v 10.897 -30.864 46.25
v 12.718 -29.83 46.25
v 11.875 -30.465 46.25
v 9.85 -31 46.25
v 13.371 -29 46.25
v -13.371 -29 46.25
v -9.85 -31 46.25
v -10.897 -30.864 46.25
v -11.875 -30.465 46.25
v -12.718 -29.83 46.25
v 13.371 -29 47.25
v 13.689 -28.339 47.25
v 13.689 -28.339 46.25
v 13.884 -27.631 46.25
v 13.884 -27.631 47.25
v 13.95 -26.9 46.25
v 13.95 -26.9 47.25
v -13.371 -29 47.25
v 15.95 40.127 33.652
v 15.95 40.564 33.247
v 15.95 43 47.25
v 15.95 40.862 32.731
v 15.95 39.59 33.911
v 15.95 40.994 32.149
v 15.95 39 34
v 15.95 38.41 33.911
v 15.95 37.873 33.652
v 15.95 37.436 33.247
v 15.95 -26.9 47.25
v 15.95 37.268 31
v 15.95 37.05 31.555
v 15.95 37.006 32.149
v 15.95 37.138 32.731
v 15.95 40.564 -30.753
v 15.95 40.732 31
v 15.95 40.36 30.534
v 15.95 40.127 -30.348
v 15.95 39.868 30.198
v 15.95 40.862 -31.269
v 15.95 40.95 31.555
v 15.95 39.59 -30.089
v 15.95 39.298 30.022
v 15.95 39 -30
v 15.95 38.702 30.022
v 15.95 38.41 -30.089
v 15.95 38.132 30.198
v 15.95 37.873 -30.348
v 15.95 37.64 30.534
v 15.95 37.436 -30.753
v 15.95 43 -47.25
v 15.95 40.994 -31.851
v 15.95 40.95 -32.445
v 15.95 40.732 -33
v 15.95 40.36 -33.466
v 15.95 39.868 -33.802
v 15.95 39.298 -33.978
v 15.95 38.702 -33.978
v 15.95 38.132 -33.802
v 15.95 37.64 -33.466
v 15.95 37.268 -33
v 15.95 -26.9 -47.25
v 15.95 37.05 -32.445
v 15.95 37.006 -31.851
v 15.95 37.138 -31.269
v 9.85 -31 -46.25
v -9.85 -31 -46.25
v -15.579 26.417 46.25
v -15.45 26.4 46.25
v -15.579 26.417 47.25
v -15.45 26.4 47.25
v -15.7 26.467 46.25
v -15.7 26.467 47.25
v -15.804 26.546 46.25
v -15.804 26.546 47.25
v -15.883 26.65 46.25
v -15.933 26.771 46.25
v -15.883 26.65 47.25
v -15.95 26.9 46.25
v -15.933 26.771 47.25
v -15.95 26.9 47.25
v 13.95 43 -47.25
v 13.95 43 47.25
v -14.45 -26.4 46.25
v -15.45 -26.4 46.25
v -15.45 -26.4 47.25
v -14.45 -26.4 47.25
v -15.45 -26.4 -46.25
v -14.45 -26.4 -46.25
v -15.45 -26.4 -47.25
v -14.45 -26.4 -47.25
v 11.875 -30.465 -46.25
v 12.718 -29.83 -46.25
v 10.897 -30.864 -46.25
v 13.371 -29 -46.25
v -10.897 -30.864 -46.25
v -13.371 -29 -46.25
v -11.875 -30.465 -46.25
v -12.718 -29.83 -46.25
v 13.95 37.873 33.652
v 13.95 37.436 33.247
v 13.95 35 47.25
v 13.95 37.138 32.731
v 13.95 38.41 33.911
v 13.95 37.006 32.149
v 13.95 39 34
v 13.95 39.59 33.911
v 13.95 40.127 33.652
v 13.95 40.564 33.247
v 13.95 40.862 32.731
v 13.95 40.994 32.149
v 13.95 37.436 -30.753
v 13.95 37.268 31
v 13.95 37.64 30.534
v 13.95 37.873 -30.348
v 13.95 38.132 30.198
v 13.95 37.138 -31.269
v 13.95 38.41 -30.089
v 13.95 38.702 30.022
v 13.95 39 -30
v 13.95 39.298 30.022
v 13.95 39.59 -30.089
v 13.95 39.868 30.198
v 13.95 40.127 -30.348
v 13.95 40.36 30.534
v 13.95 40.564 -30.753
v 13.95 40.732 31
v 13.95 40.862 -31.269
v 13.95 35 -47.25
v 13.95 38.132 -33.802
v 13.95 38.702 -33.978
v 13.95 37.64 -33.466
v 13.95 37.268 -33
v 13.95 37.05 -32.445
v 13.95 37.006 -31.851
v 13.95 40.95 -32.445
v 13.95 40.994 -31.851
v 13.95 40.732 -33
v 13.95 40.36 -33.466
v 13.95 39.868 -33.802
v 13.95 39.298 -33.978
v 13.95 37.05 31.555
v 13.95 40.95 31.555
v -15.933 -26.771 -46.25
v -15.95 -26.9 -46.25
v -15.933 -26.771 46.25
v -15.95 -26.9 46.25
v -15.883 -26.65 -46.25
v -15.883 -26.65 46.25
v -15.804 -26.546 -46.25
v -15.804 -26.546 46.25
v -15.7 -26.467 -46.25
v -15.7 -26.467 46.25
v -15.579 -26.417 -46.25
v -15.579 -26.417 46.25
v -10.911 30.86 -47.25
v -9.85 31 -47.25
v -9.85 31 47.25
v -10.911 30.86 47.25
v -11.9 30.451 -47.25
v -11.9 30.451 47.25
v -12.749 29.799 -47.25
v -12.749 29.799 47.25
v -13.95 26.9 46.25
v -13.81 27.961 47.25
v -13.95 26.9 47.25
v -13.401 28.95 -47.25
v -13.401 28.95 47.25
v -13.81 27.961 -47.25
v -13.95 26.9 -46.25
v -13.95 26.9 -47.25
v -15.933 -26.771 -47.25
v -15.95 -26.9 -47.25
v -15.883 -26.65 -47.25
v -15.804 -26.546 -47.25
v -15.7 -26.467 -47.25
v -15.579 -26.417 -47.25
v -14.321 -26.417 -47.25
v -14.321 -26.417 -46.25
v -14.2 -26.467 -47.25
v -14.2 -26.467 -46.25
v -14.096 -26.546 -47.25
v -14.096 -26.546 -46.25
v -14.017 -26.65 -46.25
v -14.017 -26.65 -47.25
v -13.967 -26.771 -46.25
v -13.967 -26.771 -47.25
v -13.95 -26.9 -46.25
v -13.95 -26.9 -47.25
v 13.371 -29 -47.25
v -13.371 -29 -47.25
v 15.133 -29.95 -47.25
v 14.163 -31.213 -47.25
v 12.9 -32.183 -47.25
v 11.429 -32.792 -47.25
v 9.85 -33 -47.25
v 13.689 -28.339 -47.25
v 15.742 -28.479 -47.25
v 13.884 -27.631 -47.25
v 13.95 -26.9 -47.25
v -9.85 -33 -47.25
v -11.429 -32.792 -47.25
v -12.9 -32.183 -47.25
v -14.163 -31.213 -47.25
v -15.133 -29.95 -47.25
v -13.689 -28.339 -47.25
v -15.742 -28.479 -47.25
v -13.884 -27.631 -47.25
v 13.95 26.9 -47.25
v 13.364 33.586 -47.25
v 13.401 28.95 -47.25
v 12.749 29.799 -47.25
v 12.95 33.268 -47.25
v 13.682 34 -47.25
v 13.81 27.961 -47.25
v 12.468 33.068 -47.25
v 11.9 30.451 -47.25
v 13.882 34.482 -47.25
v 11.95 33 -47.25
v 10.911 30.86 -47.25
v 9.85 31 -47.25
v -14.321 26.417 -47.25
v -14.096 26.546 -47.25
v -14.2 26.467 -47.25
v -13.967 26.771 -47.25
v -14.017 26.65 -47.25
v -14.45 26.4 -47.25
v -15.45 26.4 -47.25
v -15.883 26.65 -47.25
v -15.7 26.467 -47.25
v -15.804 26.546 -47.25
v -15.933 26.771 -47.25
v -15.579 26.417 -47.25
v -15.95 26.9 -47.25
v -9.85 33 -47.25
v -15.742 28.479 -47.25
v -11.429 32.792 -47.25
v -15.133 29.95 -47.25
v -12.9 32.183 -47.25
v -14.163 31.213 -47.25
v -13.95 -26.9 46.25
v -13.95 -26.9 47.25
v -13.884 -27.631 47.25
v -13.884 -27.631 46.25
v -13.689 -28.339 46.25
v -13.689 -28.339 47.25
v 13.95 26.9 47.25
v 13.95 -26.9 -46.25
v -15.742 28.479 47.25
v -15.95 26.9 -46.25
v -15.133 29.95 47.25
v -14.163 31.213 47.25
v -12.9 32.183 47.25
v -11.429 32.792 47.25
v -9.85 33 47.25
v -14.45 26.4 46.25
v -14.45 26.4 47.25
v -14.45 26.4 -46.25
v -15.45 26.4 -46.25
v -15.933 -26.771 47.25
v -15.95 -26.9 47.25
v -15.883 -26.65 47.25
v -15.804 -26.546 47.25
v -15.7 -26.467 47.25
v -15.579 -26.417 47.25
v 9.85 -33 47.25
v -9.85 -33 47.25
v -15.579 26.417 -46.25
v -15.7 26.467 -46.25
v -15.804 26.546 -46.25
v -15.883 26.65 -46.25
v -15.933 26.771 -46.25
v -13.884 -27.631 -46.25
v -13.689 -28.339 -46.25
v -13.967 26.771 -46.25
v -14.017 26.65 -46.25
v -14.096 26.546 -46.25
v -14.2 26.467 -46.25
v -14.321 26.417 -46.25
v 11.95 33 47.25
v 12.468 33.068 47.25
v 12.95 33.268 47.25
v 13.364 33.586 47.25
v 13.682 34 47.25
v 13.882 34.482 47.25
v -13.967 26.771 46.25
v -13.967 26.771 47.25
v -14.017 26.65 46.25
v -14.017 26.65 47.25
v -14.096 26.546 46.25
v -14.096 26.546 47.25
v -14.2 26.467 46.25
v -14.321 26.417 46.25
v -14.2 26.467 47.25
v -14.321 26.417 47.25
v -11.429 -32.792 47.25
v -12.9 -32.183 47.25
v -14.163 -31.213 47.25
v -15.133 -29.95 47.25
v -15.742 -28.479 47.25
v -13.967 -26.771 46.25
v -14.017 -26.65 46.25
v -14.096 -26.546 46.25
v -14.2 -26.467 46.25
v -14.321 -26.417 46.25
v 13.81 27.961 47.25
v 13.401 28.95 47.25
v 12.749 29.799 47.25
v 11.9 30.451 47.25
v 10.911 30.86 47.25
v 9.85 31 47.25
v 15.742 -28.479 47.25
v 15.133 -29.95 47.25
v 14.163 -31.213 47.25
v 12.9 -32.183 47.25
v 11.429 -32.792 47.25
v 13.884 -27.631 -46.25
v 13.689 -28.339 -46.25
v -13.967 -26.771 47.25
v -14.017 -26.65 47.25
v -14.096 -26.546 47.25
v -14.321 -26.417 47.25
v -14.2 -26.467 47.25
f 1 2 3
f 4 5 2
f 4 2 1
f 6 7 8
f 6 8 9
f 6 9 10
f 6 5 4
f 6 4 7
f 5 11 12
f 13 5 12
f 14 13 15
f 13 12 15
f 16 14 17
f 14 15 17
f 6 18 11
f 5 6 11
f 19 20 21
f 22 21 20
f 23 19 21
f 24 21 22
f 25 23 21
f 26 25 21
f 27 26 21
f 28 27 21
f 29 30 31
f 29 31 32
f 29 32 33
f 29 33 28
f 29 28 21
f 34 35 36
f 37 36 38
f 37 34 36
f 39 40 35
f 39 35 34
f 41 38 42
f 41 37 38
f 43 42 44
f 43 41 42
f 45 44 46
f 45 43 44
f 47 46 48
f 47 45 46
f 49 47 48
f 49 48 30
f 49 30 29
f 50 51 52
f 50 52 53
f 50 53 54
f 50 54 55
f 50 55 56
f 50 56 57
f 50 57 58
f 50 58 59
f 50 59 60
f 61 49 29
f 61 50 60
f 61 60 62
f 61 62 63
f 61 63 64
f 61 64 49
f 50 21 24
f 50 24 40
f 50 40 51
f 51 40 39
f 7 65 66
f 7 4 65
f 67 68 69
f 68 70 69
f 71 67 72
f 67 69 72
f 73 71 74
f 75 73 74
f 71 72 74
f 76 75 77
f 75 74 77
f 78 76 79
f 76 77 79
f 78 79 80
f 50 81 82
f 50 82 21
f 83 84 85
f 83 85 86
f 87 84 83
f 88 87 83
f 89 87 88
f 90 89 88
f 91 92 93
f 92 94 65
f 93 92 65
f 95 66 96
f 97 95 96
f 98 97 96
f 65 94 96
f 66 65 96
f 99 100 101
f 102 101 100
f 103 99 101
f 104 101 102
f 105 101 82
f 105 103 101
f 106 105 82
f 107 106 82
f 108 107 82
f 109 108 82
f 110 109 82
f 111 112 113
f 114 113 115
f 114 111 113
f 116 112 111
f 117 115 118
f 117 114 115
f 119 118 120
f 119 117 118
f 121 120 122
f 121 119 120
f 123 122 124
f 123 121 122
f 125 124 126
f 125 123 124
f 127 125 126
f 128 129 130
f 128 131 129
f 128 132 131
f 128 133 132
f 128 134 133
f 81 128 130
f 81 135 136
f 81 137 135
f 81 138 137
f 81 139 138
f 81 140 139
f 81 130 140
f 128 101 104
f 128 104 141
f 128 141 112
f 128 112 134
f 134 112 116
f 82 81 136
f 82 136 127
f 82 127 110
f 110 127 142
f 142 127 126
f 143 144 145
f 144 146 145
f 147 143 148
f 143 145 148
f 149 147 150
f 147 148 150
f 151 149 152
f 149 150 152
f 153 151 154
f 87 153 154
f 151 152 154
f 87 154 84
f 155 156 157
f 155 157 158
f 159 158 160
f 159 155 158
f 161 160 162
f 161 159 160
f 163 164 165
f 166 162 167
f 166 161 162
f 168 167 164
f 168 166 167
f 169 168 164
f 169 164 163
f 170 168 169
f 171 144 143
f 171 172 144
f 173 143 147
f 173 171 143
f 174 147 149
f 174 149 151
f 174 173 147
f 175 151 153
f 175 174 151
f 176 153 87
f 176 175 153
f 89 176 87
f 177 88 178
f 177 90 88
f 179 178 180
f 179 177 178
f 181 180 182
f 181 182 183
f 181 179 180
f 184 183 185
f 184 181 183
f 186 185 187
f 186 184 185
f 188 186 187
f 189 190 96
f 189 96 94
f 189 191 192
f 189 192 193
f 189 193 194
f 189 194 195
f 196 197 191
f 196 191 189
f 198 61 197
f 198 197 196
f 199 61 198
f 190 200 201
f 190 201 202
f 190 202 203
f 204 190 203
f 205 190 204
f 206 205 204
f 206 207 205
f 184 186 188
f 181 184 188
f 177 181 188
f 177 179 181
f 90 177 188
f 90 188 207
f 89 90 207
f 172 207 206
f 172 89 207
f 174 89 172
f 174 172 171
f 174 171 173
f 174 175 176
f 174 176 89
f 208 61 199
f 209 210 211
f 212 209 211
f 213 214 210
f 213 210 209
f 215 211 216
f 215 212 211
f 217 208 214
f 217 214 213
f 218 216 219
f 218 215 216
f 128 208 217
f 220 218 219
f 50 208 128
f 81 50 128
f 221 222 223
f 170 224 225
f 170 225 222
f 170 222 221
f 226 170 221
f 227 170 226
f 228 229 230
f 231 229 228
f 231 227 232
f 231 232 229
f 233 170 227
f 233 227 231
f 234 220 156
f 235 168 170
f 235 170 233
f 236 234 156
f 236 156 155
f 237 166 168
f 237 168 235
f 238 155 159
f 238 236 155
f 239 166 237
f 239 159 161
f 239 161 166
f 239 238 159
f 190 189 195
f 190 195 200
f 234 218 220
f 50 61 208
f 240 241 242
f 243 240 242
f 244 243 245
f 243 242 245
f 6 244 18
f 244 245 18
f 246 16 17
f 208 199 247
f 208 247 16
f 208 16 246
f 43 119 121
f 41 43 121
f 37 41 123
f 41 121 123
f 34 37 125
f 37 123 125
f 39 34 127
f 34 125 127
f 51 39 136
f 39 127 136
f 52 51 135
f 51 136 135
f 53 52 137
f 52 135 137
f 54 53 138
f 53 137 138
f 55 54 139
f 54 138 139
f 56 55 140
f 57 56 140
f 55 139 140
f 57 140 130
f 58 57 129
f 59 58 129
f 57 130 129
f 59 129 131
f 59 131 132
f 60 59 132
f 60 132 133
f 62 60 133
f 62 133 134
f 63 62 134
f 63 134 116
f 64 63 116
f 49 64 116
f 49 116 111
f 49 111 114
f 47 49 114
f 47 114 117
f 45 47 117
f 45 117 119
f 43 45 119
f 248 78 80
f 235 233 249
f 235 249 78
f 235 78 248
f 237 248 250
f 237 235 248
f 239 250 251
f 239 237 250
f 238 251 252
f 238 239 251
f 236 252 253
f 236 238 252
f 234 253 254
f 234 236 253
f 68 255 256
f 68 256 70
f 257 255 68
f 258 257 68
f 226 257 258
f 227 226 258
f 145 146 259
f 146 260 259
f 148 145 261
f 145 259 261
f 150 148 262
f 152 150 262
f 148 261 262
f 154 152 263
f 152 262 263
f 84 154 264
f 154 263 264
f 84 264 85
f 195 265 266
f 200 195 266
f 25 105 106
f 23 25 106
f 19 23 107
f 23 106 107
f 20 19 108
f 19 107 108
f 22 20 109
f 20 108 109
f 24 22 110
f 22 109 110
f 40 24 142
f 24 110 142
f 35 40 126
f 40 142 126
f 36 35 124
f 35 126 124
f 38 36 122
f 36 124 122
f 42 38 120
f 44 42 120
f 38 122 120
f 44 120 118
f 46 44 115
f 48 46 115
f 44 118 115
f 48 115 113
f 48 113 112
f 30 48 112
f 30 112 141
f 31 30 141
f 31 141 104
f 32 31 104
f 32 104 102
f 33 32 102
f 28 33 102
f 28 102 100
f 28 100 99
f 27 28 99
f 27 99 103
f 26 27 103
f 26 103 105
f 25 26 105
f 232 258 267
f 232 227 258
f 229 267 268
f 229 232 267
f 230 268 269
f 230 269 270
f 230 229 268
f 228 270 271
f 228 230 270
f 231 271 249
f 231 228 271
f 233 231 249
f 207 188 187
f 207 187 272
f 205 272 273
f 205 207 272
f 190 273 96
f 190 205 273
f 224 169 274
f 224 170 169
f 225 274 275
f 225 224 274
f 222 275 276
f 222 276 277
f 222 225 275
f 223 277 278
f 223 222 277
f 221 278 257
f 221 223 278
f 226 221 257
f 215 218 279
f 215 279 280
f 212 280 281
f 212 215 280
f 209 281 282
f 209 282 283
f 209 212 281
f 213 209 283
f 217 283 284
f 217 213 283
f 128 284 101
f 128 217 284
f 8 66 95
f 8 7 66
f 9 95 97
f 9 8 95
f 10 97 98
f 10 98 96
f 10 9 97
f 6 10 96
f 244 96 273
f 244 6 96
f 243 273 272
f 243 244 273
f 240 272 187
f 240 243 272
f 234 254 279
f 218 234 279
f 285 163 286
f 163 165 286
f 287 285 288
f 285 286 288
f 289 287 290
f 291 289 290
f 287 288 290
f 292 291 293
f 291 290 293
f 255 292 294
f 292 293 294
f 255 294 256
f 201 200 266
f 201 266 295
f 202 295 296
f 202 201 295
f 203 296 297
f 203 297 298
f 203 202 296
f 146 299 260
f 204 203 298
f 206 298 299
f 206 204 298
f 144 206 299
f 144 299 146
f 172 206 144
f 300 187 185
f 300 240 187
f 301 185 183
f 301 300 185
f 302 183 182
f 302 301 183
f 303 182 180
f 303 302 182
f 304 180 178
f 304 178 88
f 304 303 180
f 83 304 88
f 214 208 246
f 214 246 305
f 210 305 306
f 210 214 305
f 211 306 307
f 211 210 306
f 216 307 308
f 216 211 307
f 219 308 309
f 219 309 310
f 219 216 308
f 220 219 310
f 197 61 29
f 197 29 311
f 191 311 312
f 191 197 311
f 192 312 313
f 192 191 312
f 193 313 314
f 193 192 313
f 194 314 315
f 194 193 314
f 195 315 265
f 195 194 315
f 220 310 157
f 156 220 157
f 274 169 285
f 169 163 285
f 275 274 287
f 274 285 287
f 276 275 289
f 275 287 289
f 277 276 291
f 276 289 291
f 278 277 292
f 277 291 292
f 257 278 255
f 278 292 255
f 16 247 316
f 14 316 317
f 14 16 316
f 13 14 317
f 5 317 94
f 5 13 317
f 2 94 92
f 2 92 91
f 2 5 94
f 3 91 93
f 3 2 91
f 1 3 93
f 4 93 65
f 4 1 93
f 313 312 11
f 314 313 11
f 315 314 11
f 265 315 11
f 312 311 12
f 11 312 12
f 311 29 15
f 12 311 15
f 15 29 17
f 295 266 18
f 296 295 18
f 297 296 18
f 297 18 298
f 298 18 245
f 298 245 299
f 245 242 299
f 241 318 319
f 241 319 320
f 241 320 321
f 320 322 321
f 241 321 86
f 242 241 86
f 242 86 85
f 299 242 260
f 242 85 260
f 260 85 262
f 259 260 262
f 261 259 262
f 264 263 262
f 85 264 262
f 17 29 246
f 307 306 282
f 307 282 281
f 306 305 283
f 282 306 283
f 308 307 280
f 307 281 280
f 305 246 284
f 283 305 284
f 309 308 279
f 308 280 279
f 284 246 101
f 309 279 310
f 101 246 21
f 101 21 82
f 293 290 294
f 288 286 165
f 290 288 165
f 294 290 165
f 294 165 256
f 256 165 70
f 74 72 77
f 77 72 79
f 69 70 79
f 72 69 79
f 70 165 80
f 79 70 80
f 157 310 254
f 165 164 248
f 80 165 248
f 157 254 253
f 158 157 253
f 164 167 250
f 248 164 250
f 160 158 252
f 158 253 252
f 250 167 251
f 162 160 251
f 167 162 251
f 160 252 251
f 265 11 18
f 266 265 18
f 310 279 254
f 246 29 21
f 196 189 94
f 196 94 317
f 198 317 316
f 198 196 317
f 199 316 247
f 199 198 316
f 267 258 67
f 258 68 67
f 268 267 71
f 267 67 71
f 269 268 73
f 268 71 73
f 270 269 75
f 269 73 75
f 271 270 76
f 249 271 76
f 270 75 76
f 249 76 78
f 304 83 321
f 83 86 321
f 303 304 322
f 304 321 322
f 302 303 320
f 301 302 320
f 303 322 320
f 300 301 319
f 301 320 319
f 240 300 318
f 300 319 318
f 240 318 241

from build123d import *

# Parameters (mm, degrees)
BOSS_EXTRUDE1_DEPTH = 46.25
FILLET1_R           = 0.5
BOSS_EXTRUDE2_START = 1
BOSS_EXTRUDE2_DEPTH = 1
SKETCH3_R           = 2
CUT_EXTRUDE1_DEPTH  = 21


with BuildPart() as part:
    # Sketch1 → Boss-Extrude1 (new, symmetric)
    with BuildSketch(Plane(origin=(0, 0, 0), x_dir=(0, 1, 0), z_dir=(0, 0, 1))):
        with BuildLine():
            Line((-26.9, 13.95), (-26.4, 13.95))
            Line((-26.4, 13.95), (-26.4, 15.95))
            Line((-26.4, 15.95), (-26.9, 15.95))
            ThreePointArc((-26.9, 15.95), (-31.213351365, 14.163351365), (-33, 9.85))
            Line((-33, 9.85), (-33, -9.85))
            ThreePointArc((-33, -9.85), (-31.213351365, -14.163351365), (-26.9, -15.95))
            Line((-26.9, -15.95), (26.9, -15.95))
            Line((26.9, -15.95), (43, -15.95))
            Line((43, -15.95), (43, -13.95))
            Line((43, -13.95), (35, -13.95))
            ThreePointArc((35, -13.95), (33.585786438, -13.364213562), (33, -11.95))
            Line((33, -11.95), (33, -9.85))
            Line((33, -9.85), (33, 9.85))
            ThreePointArc((33, 9.85), (31.213351365, 14.163351365), (26.9, 15.95))
            Line((26.9, 15.95), (26.4, 15.95))
            Line((26.4, 15.95), (26.4, 13.95))
            Line((26.4, 13.95), (26.9, 13.95))
            ThreePointArc((26.9, 13.95), (29.799137803, 12.749137803), (31, 9.85))
            Line((31, 9.85), (31, -9.85))
            ThreePointArc((31, -9.85), (29.799137803, -12.749137803), (26.9, -13.95))
            Line((26.9, -13.95), (-26.9, -13.95))
            ThreePointArc((-26.9, -13.95), (-29.799137803, -12.749137803), (-31, -9.85))
            Line((-31, -9.85), (-31, 9.85))
            ThreePointArc((-31, 9.85), (-29.799137803, 12.749137803), (-26.9, 13.95))
        make_face()
    extrude(amount=BOSS_EXTRUDE1_DEPTH, both=True)

    # Fillet1
    fillet1_edges = [part.edges().sort_by_distance(p)[0] for p in [
        (-15.95, 26.4, 0),
        (-13.95, 26.4, 0),
        (-13.95, -26.4, 0),
        (-15.95, -26.4, 0),
    ]]
    fillet(fillet1_edges, radius=FILLET1_R - 0.0001)  # a hair under: the kernel refuses the full size

    # Sketch2 → Boss-Extrude2 (add)
    with BuildSketch(Plane.XY.offset(46.25).offset(BOSS_EXTRUDE2_START)):
        with BuildLine():
            Line((-13.371363372, -29), (13.371363372, -29))
            ThreePointArc((13.371363372, -29), (13.80269464, -27.989130427), (13.95, -26.9))
            Line((13.95, -26.9), (13.95, 26.9))
            ThreePointArc((13.95, 26.9), (12.749137803, 29.799137803), (9.85, 31))
            Line((9.85, 31), (-9.85, 31))
            ThreePointArc((-9.85, 31), (-12.749137803, 29.799137803), (-13.95, 26.9))
            ThreePointArc((-13.95, 26.9), (-14.096446609, 26.546446609), (-14.45, 26.4))
            Line((-14.45, 26.4), (-15.45, 26.4))
            ThreePointArc((-15.45, 26.4), (-15.803553391, 26.546446609), (-15.95, 26.9))
            ThreePointArc((-15.95, 26.9), (-14.163351365, 31.213351365), (-9.85, 33))
            Line((-9.85, 33), (11.95, 33))
            ThreePointArc((11.95, 33), (13.364213562, 33.585786438), (13.95, 35))
            Line((13.95, 35), (13.95, 43))
            Line((13.95, 43), (15.95, 43))
            Line((15.95, 43), (15.95, -26.9))
            ThreePointArc((15.95, -26.9), (14.163351365, -31.213351365), (9.85, -33))
            Line((9.85, -33), (-9.85, -33))
            ThreePointArc((-9.85, -33), (-14.163351365, -31.213351365), (-15.95, -26.9))
            ThreePointArc((-15.95, -26.9), (-15.803553391, -26.546446609), (-15.45, -26.4))
            Line((-15.45, -26.4), (-14.45, -26.4))
            ThreePointArc((-14.45, -26.4), (-14.096446609, -26.546446609), (-13.95, -26.9))
            ThreePointArc((-13.95, -26.9), (-13.80269464, -27.989130427), (-13.371363372, -29))
        make_face()
    boss_extrude2 = extrude(amount=-BOSS_EXTRUDE2_DEPTH)

    # Mirror1: Boss-Extrude2 across plane
    add(boss_extrude2.mirror(Plane.XY))

    # Sketch3 → Cut-Extrude1 (cut)
    with BuildSketch(Plane(origin=(13.95, 0, 0), x_dir=(0, -1, 0), z_dir=(-1, 0, 0))):
        with Locations(Location((-39, 32, 0), (0, 0, 90))):
            Circle(SKETCH3_R)
        with Locations(Location((-39, -32, 0), (0, 0, 90))):
            Circle(SKETCH3_R)
    extrude(amount=-CUT_EXTRUDE1_DEPTH, mode=Mode.SUBTRACT)


solid = part.part
